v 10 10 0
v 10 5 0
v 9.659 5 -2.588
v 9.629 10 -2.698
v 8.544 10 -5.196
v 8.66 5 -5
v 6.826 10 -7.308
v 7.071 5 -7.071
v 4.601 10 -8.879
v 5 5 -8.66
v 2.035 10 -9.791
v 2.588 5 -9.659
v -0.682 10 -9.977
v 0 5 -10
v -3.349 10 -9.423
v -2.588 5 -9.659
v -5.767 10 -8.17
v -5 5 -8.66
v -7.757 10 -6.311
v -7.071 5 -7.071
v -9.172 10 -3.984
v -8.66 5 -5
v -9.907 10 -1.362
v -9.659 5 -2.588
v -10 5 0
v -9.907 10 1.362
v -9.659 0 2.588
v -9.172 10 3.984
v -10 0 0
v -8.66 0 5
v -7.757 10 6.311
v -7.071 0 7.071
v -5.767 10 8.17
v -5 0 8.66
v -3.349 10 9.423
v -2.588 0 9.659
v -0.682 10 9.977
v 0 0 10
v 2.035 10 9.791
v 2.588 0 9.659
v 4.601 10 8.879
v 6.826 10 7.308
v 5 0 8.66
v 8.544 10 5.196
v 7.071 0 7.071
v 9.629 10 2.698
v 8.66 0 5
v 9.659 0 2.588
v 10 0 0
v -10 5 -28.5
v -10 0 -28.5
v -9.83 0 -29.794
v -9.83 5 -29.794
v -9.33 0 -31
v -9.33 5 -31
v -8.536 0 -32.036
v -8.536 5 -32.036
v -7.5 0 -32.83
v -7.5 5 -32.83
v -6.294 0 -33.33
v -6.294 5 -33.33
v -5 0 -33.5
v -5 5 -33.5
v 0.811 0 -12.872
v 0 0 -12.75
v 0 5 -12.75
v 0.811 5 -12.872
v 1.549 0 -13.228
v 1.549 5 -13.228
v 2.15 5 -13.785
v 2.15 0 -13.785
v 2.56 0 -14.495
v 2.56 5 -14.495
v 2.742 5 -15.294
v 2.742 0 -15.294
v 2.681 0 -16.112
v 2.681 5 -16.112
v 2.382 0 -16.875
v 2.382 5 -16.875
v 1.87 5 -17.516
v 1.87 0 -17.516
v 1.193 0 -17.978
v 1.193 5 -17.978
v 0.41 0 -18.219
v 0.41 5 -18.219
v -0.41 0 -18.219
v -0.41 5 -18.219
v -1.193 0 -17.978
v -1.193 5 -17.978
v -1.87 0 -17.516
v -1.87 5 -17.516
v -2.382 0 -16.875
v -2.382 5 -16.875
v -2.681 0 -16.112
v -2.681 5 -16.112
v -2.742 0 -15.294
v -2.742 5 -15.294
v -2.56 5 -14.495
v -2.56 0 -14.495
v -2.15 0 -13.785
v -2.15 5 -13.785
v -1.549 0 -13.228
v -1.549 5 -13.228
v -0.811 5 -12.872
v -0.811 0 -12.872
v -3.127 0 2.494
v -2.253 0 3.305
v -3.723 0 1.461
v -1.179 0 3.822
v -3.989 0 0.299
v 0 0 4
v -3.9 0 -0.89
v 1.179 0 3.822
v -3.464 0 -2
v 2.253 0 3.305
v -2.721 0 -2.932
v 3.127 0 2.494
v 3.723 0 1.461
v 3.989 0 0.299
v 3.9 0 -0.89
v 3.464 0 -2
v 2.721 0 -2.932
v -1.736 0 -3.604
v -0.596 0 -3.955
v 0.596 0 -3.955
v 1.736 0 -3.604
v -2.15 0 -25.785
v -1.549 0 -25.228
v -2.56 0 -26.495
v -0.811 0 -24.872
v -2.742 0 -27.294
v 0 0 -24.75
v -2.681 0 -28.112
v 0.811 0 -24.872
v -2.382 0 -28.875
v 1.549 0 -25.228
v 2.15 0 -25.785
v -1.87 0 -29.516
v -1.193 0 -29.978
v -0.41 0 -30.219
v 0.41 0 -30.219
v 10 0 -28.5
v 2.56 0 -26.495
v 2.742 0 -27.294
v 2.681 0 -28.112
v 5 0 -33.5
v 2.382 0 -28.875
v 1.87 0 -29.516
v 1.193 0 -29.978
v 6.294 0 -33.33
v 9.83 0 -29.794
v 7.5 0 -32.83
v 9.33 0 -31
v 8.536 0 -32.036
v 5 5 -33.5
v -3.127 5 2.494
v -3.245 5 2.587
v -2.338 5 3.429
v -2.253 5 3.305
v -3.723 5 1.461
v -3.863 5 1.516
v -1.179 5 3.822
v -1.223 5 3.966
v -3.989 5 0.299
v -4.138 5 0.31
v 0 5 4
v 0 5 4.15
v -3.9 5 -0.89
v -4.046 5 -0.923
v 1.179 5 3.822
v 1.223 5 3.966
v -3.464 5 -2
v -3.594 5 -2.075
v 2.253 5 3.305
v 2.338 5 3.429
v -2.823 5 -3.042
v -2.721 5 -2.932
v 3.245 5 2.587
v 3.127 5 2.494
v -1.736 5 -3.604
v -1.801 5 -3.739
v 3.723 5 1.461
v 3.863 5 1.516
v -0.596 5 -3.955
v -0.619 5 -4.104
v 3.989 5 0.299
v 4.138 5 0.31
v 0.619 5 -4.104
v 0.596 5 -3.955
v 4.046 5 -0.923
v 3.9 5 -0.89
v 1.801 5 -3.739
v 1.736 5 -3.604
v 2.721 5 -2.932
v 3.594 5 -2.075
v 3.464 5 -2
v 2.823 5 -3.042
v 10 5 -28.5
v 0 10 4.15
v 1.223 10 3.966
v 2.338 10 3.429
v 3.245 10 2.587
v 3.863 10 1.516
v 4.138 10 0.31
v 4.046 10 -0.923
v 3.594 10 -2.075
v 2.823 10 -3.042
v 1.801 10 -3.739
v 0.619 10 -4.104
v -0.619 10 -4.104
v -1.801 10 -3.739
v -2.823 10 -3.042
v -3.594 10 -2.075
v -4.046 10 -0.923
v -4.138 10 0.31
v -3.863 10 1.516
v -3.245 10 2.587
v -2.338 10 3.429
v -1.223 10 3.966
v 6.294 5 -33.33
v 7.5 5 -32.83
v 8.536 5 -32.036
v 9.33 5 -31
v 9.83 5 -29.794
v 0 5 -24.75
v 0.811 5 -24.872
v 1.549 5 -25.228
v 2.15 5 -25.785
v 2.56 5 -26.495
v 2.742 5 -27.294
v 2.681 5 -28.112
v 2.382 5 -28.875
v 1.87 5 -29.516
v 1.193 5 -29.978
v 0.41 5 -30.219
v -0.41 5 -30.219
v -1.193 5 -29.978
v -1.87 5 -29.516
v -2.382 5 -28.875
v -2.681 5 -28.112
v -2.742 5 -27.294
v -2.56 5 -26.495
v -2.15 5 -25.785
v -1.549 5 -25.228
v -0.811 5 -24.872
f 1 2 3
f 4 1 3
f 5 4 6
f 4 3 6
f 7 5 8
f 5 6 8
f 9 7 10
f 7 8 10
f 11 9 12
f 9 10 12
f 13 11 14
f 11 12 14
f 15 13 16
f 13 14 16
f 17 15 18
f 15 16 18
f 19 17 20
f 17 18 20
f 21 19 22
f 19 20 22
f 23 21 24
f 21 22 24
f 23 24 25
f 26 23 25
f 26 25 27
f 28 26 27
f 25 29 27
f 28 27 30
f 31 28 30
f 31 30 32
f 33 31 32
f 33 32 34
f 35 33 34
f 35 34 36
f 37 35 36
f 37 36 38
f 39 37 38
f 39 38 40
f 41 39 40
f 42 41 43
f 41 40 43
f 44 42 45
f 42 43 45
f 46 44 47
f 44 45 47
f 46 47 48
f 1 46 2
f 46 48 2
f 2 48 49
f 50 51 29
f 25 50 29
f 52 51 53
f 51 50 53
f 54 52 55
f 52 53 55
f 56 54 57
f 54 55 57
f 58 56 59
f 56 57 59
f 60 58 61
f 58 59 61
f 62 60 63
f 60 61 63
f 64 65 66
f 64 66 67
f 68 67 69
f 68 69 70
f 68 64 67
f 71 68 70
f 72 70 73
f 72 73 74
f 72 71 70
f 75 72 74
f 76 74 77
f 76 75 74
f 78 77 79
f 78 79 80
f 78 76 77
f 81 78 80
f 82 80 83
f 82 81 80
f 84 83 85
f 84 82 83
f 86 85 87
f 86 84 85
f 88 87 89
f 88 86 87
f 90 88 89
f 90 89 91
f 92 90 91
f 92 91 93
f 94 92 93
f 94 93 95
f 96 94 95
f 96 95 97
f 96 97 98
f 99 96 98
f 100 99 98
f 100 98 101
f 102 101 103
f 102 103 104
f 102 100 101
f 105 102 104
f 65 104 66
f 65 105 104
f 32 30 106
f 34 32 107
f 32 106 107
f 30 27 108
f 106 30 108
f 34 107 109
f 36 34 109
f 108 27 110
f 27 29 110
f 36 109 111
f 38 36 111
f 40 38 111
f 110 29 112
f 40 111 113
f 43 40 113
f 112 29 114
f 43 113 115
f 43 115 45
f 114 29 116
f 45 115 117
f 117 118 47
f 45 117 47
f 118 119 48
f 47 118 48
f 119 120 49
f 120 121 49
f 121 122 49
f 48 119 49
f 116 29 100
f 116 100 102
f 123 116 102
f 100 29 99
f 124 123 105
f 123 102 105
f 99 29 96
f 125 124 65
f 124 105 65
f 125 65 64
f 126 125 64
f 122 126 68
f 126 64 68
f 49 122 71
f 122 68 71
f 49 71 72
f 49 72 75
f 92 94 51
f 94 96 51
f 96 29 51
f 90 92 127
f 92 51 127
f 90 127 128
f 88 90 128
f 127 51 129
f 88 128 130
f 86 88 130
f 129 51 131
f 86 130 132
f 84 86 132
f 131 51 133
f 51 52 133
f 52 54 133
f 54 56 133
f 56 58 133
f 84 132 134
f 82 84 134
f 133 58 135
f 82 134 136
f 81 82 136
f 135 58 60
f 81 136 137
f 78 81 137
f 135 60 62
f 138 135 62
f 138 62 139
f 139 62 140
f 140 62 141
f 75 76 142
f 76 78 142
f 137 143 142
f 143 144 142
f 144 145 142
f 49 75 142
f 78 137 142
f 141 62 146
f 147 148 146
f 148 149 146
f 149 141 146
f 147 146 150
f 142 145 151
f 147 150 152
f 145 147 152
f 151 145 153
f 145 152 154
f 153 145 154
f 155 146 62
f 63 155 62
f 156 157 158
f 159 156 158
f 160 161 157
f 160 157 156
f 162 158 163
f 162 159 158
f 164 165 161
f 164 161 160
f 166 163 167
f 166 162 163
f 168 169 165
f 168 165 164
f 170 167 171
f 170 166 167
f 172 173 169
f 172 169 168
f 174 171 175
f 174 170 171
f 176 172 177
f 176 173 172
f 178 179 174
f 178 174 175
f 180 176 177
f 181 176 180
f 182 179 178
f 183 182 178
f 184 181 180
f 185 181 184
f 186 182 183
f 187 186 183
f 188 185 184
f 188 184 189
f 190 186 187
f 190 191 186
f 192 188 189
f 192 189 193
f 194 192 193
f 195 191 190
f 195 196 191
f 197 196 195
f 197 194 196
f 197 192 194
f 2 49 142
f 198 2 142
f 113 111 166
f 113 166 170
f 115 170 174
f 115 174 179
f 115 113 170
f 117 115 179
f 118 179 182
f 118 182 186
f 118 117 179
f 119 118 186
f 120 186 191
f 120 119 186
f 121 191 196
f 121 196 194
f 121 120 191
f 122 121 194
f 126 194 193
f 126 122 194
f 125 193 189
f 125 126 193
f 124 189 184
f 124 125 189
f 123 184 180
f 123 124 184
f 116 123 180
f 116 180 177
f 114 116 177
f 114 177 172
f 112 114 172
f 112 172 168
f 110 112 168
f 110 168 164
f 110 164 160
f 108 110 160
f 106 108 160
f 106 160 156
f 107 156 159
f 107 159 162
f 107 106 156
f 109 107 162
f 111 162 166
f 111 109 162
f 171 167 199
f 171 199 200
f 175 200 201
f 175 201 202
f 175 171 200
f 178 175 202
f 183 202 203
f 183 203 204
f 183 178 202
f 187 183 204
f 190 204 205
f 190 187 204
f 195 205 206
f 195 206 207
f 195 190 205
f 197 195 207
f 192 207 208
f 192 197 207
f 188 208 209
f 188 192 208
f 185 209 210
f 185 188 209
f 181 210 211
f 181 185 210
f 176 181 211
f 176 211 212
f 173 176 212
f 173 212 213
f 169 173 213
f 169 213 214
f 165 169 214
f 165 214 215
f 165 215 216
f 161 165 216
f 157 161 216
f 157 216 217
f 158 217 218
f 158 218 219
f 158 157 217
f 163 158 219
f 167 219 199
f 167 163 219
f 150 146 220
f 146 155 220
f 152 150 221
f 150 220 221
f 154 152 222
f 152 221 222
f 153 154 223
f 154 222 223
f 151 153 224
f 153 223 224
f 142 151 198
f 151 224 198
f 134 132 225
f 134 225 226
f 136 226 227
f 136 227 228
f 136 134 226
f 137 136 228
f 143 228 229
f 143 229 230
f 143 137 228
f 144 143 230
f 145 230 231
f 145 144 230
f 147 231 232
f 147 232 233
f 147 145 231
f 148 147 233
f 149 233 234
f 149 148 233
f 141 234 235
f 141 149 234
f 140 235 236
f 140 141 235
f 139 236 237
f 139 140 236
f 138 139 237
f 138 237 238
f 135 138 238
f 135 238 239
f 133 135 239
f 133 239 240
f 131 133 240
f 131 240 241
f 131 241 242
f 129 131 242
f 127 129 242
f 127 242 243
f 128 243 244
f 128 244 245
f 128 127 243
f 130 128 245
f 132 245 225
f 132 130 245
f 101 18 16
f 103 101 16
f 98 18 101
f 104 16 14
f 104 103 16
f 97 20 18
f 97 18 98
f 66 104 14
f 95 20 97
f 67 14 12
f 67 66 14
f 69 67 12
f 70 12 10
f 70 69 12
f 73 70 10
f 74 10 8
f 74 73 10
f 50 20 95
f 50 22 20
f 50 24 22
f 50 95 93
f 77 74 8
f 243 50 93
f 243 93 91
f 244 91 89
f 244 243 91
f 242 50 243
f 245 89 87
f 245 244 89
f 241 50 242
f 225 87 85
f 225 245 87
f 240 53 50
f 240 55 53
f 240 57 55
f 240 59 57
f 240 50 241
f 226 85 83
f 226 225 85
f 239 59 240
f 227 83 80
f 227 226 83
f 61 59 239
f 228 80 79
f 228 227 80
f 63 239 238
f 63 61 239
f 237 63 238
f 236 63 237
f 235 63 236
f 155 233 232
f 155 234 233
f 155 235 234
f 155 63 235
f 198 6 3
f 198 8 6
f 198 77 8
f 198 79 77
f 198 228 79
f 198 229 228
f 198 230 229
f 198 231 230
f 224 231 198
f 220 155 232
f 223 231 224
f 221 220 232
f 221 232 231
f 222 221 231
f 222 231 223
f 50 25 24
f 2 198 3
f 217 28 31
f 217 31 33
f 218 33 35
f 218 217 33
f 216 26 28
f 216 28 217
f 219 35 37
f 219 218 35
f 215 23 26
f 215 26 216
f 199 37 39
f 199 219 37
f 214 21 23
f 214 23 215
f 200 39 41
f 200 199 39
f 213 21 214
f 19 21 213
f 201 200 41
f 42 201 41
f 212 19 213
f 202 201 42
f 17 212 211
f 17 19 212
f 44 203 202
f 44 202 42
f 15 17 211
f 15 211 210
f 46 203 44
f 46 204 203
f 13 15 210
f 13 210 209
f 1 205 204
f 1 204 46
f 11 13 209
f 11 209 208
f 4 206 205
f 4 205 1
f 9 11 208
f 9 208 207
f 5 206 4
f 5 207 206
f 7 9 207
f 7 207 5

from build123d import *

# Parameters (mm, degrees)
SKETCH_1_R      = 2.75
SKETCH_1_R_2    = 4
EXTRUDE_1_DEPTH = 5
SKETCH_2_R      = 10
SKETCH_2_R_2    = 4.15
EXTRUDE_2_DEPTH = 5
FILLET_1_R      = 5


with BuildPart() as part:
    # 草图1 → 凸台-拉伸1 (new body)
    with BuildSketch(Plane(origin=(0, 0, 0), x_dir=(1, 0, 0), z_dir=(0, 1, 0))):
        with BuildLine():
            Line((10, 0), (10, 33.5))
            Line((10, 33.5), (-10, 33.5))
            Line((-10, 33.5), (-10, 0))
            ThreePointArc((-10, 0), (0, -10), (10, 0))
        make_face()
        with Locations(Location((0, 27.5, 0), (0, 0, 270))):
            Circle(SKETCH_1_R, mode=Mode.SUBTRACT)
        with Locations(Location((0, 15.5, 0), (0, 0, 270))):
            Circle(SKETCH_1_R, mode=Mode.SUBTRACT)
        with Locations(Location((0, 0, 0), (0, 0, 270))):
            Circle(SKETCH_1_R_2, mode=Mode.SUBTRACT)
    extrude(amount=EXTRUDE_1_DEPTH)

    # 草图2 → 凸台-拉伸2 (add)
    with BuildSketch(Plane(origin=(0, 5, 0), x_dir=(1, 0, 0), z_dir=(0, 1, 0))):
        Circle(SKETCH_2_R)
        with Locations(Location((0, 0, 0), (0, 0, 270))):
            Circle(SKETCH_2_R_2, mode=Mode.SUBTRACT)
    extrude(amount=EXTRUDE_2_DEPTH)

    # 圆角1
    fillet_1_edges = [part.edges().sort_by_distance(p)[0] for p in [
        (-10, 2.5, -33.5),
        (10, 2.5, -33.5),
    ]]
    fillet(fillet_1_edges, radius=FILLET_1_R)


solid = part.part
